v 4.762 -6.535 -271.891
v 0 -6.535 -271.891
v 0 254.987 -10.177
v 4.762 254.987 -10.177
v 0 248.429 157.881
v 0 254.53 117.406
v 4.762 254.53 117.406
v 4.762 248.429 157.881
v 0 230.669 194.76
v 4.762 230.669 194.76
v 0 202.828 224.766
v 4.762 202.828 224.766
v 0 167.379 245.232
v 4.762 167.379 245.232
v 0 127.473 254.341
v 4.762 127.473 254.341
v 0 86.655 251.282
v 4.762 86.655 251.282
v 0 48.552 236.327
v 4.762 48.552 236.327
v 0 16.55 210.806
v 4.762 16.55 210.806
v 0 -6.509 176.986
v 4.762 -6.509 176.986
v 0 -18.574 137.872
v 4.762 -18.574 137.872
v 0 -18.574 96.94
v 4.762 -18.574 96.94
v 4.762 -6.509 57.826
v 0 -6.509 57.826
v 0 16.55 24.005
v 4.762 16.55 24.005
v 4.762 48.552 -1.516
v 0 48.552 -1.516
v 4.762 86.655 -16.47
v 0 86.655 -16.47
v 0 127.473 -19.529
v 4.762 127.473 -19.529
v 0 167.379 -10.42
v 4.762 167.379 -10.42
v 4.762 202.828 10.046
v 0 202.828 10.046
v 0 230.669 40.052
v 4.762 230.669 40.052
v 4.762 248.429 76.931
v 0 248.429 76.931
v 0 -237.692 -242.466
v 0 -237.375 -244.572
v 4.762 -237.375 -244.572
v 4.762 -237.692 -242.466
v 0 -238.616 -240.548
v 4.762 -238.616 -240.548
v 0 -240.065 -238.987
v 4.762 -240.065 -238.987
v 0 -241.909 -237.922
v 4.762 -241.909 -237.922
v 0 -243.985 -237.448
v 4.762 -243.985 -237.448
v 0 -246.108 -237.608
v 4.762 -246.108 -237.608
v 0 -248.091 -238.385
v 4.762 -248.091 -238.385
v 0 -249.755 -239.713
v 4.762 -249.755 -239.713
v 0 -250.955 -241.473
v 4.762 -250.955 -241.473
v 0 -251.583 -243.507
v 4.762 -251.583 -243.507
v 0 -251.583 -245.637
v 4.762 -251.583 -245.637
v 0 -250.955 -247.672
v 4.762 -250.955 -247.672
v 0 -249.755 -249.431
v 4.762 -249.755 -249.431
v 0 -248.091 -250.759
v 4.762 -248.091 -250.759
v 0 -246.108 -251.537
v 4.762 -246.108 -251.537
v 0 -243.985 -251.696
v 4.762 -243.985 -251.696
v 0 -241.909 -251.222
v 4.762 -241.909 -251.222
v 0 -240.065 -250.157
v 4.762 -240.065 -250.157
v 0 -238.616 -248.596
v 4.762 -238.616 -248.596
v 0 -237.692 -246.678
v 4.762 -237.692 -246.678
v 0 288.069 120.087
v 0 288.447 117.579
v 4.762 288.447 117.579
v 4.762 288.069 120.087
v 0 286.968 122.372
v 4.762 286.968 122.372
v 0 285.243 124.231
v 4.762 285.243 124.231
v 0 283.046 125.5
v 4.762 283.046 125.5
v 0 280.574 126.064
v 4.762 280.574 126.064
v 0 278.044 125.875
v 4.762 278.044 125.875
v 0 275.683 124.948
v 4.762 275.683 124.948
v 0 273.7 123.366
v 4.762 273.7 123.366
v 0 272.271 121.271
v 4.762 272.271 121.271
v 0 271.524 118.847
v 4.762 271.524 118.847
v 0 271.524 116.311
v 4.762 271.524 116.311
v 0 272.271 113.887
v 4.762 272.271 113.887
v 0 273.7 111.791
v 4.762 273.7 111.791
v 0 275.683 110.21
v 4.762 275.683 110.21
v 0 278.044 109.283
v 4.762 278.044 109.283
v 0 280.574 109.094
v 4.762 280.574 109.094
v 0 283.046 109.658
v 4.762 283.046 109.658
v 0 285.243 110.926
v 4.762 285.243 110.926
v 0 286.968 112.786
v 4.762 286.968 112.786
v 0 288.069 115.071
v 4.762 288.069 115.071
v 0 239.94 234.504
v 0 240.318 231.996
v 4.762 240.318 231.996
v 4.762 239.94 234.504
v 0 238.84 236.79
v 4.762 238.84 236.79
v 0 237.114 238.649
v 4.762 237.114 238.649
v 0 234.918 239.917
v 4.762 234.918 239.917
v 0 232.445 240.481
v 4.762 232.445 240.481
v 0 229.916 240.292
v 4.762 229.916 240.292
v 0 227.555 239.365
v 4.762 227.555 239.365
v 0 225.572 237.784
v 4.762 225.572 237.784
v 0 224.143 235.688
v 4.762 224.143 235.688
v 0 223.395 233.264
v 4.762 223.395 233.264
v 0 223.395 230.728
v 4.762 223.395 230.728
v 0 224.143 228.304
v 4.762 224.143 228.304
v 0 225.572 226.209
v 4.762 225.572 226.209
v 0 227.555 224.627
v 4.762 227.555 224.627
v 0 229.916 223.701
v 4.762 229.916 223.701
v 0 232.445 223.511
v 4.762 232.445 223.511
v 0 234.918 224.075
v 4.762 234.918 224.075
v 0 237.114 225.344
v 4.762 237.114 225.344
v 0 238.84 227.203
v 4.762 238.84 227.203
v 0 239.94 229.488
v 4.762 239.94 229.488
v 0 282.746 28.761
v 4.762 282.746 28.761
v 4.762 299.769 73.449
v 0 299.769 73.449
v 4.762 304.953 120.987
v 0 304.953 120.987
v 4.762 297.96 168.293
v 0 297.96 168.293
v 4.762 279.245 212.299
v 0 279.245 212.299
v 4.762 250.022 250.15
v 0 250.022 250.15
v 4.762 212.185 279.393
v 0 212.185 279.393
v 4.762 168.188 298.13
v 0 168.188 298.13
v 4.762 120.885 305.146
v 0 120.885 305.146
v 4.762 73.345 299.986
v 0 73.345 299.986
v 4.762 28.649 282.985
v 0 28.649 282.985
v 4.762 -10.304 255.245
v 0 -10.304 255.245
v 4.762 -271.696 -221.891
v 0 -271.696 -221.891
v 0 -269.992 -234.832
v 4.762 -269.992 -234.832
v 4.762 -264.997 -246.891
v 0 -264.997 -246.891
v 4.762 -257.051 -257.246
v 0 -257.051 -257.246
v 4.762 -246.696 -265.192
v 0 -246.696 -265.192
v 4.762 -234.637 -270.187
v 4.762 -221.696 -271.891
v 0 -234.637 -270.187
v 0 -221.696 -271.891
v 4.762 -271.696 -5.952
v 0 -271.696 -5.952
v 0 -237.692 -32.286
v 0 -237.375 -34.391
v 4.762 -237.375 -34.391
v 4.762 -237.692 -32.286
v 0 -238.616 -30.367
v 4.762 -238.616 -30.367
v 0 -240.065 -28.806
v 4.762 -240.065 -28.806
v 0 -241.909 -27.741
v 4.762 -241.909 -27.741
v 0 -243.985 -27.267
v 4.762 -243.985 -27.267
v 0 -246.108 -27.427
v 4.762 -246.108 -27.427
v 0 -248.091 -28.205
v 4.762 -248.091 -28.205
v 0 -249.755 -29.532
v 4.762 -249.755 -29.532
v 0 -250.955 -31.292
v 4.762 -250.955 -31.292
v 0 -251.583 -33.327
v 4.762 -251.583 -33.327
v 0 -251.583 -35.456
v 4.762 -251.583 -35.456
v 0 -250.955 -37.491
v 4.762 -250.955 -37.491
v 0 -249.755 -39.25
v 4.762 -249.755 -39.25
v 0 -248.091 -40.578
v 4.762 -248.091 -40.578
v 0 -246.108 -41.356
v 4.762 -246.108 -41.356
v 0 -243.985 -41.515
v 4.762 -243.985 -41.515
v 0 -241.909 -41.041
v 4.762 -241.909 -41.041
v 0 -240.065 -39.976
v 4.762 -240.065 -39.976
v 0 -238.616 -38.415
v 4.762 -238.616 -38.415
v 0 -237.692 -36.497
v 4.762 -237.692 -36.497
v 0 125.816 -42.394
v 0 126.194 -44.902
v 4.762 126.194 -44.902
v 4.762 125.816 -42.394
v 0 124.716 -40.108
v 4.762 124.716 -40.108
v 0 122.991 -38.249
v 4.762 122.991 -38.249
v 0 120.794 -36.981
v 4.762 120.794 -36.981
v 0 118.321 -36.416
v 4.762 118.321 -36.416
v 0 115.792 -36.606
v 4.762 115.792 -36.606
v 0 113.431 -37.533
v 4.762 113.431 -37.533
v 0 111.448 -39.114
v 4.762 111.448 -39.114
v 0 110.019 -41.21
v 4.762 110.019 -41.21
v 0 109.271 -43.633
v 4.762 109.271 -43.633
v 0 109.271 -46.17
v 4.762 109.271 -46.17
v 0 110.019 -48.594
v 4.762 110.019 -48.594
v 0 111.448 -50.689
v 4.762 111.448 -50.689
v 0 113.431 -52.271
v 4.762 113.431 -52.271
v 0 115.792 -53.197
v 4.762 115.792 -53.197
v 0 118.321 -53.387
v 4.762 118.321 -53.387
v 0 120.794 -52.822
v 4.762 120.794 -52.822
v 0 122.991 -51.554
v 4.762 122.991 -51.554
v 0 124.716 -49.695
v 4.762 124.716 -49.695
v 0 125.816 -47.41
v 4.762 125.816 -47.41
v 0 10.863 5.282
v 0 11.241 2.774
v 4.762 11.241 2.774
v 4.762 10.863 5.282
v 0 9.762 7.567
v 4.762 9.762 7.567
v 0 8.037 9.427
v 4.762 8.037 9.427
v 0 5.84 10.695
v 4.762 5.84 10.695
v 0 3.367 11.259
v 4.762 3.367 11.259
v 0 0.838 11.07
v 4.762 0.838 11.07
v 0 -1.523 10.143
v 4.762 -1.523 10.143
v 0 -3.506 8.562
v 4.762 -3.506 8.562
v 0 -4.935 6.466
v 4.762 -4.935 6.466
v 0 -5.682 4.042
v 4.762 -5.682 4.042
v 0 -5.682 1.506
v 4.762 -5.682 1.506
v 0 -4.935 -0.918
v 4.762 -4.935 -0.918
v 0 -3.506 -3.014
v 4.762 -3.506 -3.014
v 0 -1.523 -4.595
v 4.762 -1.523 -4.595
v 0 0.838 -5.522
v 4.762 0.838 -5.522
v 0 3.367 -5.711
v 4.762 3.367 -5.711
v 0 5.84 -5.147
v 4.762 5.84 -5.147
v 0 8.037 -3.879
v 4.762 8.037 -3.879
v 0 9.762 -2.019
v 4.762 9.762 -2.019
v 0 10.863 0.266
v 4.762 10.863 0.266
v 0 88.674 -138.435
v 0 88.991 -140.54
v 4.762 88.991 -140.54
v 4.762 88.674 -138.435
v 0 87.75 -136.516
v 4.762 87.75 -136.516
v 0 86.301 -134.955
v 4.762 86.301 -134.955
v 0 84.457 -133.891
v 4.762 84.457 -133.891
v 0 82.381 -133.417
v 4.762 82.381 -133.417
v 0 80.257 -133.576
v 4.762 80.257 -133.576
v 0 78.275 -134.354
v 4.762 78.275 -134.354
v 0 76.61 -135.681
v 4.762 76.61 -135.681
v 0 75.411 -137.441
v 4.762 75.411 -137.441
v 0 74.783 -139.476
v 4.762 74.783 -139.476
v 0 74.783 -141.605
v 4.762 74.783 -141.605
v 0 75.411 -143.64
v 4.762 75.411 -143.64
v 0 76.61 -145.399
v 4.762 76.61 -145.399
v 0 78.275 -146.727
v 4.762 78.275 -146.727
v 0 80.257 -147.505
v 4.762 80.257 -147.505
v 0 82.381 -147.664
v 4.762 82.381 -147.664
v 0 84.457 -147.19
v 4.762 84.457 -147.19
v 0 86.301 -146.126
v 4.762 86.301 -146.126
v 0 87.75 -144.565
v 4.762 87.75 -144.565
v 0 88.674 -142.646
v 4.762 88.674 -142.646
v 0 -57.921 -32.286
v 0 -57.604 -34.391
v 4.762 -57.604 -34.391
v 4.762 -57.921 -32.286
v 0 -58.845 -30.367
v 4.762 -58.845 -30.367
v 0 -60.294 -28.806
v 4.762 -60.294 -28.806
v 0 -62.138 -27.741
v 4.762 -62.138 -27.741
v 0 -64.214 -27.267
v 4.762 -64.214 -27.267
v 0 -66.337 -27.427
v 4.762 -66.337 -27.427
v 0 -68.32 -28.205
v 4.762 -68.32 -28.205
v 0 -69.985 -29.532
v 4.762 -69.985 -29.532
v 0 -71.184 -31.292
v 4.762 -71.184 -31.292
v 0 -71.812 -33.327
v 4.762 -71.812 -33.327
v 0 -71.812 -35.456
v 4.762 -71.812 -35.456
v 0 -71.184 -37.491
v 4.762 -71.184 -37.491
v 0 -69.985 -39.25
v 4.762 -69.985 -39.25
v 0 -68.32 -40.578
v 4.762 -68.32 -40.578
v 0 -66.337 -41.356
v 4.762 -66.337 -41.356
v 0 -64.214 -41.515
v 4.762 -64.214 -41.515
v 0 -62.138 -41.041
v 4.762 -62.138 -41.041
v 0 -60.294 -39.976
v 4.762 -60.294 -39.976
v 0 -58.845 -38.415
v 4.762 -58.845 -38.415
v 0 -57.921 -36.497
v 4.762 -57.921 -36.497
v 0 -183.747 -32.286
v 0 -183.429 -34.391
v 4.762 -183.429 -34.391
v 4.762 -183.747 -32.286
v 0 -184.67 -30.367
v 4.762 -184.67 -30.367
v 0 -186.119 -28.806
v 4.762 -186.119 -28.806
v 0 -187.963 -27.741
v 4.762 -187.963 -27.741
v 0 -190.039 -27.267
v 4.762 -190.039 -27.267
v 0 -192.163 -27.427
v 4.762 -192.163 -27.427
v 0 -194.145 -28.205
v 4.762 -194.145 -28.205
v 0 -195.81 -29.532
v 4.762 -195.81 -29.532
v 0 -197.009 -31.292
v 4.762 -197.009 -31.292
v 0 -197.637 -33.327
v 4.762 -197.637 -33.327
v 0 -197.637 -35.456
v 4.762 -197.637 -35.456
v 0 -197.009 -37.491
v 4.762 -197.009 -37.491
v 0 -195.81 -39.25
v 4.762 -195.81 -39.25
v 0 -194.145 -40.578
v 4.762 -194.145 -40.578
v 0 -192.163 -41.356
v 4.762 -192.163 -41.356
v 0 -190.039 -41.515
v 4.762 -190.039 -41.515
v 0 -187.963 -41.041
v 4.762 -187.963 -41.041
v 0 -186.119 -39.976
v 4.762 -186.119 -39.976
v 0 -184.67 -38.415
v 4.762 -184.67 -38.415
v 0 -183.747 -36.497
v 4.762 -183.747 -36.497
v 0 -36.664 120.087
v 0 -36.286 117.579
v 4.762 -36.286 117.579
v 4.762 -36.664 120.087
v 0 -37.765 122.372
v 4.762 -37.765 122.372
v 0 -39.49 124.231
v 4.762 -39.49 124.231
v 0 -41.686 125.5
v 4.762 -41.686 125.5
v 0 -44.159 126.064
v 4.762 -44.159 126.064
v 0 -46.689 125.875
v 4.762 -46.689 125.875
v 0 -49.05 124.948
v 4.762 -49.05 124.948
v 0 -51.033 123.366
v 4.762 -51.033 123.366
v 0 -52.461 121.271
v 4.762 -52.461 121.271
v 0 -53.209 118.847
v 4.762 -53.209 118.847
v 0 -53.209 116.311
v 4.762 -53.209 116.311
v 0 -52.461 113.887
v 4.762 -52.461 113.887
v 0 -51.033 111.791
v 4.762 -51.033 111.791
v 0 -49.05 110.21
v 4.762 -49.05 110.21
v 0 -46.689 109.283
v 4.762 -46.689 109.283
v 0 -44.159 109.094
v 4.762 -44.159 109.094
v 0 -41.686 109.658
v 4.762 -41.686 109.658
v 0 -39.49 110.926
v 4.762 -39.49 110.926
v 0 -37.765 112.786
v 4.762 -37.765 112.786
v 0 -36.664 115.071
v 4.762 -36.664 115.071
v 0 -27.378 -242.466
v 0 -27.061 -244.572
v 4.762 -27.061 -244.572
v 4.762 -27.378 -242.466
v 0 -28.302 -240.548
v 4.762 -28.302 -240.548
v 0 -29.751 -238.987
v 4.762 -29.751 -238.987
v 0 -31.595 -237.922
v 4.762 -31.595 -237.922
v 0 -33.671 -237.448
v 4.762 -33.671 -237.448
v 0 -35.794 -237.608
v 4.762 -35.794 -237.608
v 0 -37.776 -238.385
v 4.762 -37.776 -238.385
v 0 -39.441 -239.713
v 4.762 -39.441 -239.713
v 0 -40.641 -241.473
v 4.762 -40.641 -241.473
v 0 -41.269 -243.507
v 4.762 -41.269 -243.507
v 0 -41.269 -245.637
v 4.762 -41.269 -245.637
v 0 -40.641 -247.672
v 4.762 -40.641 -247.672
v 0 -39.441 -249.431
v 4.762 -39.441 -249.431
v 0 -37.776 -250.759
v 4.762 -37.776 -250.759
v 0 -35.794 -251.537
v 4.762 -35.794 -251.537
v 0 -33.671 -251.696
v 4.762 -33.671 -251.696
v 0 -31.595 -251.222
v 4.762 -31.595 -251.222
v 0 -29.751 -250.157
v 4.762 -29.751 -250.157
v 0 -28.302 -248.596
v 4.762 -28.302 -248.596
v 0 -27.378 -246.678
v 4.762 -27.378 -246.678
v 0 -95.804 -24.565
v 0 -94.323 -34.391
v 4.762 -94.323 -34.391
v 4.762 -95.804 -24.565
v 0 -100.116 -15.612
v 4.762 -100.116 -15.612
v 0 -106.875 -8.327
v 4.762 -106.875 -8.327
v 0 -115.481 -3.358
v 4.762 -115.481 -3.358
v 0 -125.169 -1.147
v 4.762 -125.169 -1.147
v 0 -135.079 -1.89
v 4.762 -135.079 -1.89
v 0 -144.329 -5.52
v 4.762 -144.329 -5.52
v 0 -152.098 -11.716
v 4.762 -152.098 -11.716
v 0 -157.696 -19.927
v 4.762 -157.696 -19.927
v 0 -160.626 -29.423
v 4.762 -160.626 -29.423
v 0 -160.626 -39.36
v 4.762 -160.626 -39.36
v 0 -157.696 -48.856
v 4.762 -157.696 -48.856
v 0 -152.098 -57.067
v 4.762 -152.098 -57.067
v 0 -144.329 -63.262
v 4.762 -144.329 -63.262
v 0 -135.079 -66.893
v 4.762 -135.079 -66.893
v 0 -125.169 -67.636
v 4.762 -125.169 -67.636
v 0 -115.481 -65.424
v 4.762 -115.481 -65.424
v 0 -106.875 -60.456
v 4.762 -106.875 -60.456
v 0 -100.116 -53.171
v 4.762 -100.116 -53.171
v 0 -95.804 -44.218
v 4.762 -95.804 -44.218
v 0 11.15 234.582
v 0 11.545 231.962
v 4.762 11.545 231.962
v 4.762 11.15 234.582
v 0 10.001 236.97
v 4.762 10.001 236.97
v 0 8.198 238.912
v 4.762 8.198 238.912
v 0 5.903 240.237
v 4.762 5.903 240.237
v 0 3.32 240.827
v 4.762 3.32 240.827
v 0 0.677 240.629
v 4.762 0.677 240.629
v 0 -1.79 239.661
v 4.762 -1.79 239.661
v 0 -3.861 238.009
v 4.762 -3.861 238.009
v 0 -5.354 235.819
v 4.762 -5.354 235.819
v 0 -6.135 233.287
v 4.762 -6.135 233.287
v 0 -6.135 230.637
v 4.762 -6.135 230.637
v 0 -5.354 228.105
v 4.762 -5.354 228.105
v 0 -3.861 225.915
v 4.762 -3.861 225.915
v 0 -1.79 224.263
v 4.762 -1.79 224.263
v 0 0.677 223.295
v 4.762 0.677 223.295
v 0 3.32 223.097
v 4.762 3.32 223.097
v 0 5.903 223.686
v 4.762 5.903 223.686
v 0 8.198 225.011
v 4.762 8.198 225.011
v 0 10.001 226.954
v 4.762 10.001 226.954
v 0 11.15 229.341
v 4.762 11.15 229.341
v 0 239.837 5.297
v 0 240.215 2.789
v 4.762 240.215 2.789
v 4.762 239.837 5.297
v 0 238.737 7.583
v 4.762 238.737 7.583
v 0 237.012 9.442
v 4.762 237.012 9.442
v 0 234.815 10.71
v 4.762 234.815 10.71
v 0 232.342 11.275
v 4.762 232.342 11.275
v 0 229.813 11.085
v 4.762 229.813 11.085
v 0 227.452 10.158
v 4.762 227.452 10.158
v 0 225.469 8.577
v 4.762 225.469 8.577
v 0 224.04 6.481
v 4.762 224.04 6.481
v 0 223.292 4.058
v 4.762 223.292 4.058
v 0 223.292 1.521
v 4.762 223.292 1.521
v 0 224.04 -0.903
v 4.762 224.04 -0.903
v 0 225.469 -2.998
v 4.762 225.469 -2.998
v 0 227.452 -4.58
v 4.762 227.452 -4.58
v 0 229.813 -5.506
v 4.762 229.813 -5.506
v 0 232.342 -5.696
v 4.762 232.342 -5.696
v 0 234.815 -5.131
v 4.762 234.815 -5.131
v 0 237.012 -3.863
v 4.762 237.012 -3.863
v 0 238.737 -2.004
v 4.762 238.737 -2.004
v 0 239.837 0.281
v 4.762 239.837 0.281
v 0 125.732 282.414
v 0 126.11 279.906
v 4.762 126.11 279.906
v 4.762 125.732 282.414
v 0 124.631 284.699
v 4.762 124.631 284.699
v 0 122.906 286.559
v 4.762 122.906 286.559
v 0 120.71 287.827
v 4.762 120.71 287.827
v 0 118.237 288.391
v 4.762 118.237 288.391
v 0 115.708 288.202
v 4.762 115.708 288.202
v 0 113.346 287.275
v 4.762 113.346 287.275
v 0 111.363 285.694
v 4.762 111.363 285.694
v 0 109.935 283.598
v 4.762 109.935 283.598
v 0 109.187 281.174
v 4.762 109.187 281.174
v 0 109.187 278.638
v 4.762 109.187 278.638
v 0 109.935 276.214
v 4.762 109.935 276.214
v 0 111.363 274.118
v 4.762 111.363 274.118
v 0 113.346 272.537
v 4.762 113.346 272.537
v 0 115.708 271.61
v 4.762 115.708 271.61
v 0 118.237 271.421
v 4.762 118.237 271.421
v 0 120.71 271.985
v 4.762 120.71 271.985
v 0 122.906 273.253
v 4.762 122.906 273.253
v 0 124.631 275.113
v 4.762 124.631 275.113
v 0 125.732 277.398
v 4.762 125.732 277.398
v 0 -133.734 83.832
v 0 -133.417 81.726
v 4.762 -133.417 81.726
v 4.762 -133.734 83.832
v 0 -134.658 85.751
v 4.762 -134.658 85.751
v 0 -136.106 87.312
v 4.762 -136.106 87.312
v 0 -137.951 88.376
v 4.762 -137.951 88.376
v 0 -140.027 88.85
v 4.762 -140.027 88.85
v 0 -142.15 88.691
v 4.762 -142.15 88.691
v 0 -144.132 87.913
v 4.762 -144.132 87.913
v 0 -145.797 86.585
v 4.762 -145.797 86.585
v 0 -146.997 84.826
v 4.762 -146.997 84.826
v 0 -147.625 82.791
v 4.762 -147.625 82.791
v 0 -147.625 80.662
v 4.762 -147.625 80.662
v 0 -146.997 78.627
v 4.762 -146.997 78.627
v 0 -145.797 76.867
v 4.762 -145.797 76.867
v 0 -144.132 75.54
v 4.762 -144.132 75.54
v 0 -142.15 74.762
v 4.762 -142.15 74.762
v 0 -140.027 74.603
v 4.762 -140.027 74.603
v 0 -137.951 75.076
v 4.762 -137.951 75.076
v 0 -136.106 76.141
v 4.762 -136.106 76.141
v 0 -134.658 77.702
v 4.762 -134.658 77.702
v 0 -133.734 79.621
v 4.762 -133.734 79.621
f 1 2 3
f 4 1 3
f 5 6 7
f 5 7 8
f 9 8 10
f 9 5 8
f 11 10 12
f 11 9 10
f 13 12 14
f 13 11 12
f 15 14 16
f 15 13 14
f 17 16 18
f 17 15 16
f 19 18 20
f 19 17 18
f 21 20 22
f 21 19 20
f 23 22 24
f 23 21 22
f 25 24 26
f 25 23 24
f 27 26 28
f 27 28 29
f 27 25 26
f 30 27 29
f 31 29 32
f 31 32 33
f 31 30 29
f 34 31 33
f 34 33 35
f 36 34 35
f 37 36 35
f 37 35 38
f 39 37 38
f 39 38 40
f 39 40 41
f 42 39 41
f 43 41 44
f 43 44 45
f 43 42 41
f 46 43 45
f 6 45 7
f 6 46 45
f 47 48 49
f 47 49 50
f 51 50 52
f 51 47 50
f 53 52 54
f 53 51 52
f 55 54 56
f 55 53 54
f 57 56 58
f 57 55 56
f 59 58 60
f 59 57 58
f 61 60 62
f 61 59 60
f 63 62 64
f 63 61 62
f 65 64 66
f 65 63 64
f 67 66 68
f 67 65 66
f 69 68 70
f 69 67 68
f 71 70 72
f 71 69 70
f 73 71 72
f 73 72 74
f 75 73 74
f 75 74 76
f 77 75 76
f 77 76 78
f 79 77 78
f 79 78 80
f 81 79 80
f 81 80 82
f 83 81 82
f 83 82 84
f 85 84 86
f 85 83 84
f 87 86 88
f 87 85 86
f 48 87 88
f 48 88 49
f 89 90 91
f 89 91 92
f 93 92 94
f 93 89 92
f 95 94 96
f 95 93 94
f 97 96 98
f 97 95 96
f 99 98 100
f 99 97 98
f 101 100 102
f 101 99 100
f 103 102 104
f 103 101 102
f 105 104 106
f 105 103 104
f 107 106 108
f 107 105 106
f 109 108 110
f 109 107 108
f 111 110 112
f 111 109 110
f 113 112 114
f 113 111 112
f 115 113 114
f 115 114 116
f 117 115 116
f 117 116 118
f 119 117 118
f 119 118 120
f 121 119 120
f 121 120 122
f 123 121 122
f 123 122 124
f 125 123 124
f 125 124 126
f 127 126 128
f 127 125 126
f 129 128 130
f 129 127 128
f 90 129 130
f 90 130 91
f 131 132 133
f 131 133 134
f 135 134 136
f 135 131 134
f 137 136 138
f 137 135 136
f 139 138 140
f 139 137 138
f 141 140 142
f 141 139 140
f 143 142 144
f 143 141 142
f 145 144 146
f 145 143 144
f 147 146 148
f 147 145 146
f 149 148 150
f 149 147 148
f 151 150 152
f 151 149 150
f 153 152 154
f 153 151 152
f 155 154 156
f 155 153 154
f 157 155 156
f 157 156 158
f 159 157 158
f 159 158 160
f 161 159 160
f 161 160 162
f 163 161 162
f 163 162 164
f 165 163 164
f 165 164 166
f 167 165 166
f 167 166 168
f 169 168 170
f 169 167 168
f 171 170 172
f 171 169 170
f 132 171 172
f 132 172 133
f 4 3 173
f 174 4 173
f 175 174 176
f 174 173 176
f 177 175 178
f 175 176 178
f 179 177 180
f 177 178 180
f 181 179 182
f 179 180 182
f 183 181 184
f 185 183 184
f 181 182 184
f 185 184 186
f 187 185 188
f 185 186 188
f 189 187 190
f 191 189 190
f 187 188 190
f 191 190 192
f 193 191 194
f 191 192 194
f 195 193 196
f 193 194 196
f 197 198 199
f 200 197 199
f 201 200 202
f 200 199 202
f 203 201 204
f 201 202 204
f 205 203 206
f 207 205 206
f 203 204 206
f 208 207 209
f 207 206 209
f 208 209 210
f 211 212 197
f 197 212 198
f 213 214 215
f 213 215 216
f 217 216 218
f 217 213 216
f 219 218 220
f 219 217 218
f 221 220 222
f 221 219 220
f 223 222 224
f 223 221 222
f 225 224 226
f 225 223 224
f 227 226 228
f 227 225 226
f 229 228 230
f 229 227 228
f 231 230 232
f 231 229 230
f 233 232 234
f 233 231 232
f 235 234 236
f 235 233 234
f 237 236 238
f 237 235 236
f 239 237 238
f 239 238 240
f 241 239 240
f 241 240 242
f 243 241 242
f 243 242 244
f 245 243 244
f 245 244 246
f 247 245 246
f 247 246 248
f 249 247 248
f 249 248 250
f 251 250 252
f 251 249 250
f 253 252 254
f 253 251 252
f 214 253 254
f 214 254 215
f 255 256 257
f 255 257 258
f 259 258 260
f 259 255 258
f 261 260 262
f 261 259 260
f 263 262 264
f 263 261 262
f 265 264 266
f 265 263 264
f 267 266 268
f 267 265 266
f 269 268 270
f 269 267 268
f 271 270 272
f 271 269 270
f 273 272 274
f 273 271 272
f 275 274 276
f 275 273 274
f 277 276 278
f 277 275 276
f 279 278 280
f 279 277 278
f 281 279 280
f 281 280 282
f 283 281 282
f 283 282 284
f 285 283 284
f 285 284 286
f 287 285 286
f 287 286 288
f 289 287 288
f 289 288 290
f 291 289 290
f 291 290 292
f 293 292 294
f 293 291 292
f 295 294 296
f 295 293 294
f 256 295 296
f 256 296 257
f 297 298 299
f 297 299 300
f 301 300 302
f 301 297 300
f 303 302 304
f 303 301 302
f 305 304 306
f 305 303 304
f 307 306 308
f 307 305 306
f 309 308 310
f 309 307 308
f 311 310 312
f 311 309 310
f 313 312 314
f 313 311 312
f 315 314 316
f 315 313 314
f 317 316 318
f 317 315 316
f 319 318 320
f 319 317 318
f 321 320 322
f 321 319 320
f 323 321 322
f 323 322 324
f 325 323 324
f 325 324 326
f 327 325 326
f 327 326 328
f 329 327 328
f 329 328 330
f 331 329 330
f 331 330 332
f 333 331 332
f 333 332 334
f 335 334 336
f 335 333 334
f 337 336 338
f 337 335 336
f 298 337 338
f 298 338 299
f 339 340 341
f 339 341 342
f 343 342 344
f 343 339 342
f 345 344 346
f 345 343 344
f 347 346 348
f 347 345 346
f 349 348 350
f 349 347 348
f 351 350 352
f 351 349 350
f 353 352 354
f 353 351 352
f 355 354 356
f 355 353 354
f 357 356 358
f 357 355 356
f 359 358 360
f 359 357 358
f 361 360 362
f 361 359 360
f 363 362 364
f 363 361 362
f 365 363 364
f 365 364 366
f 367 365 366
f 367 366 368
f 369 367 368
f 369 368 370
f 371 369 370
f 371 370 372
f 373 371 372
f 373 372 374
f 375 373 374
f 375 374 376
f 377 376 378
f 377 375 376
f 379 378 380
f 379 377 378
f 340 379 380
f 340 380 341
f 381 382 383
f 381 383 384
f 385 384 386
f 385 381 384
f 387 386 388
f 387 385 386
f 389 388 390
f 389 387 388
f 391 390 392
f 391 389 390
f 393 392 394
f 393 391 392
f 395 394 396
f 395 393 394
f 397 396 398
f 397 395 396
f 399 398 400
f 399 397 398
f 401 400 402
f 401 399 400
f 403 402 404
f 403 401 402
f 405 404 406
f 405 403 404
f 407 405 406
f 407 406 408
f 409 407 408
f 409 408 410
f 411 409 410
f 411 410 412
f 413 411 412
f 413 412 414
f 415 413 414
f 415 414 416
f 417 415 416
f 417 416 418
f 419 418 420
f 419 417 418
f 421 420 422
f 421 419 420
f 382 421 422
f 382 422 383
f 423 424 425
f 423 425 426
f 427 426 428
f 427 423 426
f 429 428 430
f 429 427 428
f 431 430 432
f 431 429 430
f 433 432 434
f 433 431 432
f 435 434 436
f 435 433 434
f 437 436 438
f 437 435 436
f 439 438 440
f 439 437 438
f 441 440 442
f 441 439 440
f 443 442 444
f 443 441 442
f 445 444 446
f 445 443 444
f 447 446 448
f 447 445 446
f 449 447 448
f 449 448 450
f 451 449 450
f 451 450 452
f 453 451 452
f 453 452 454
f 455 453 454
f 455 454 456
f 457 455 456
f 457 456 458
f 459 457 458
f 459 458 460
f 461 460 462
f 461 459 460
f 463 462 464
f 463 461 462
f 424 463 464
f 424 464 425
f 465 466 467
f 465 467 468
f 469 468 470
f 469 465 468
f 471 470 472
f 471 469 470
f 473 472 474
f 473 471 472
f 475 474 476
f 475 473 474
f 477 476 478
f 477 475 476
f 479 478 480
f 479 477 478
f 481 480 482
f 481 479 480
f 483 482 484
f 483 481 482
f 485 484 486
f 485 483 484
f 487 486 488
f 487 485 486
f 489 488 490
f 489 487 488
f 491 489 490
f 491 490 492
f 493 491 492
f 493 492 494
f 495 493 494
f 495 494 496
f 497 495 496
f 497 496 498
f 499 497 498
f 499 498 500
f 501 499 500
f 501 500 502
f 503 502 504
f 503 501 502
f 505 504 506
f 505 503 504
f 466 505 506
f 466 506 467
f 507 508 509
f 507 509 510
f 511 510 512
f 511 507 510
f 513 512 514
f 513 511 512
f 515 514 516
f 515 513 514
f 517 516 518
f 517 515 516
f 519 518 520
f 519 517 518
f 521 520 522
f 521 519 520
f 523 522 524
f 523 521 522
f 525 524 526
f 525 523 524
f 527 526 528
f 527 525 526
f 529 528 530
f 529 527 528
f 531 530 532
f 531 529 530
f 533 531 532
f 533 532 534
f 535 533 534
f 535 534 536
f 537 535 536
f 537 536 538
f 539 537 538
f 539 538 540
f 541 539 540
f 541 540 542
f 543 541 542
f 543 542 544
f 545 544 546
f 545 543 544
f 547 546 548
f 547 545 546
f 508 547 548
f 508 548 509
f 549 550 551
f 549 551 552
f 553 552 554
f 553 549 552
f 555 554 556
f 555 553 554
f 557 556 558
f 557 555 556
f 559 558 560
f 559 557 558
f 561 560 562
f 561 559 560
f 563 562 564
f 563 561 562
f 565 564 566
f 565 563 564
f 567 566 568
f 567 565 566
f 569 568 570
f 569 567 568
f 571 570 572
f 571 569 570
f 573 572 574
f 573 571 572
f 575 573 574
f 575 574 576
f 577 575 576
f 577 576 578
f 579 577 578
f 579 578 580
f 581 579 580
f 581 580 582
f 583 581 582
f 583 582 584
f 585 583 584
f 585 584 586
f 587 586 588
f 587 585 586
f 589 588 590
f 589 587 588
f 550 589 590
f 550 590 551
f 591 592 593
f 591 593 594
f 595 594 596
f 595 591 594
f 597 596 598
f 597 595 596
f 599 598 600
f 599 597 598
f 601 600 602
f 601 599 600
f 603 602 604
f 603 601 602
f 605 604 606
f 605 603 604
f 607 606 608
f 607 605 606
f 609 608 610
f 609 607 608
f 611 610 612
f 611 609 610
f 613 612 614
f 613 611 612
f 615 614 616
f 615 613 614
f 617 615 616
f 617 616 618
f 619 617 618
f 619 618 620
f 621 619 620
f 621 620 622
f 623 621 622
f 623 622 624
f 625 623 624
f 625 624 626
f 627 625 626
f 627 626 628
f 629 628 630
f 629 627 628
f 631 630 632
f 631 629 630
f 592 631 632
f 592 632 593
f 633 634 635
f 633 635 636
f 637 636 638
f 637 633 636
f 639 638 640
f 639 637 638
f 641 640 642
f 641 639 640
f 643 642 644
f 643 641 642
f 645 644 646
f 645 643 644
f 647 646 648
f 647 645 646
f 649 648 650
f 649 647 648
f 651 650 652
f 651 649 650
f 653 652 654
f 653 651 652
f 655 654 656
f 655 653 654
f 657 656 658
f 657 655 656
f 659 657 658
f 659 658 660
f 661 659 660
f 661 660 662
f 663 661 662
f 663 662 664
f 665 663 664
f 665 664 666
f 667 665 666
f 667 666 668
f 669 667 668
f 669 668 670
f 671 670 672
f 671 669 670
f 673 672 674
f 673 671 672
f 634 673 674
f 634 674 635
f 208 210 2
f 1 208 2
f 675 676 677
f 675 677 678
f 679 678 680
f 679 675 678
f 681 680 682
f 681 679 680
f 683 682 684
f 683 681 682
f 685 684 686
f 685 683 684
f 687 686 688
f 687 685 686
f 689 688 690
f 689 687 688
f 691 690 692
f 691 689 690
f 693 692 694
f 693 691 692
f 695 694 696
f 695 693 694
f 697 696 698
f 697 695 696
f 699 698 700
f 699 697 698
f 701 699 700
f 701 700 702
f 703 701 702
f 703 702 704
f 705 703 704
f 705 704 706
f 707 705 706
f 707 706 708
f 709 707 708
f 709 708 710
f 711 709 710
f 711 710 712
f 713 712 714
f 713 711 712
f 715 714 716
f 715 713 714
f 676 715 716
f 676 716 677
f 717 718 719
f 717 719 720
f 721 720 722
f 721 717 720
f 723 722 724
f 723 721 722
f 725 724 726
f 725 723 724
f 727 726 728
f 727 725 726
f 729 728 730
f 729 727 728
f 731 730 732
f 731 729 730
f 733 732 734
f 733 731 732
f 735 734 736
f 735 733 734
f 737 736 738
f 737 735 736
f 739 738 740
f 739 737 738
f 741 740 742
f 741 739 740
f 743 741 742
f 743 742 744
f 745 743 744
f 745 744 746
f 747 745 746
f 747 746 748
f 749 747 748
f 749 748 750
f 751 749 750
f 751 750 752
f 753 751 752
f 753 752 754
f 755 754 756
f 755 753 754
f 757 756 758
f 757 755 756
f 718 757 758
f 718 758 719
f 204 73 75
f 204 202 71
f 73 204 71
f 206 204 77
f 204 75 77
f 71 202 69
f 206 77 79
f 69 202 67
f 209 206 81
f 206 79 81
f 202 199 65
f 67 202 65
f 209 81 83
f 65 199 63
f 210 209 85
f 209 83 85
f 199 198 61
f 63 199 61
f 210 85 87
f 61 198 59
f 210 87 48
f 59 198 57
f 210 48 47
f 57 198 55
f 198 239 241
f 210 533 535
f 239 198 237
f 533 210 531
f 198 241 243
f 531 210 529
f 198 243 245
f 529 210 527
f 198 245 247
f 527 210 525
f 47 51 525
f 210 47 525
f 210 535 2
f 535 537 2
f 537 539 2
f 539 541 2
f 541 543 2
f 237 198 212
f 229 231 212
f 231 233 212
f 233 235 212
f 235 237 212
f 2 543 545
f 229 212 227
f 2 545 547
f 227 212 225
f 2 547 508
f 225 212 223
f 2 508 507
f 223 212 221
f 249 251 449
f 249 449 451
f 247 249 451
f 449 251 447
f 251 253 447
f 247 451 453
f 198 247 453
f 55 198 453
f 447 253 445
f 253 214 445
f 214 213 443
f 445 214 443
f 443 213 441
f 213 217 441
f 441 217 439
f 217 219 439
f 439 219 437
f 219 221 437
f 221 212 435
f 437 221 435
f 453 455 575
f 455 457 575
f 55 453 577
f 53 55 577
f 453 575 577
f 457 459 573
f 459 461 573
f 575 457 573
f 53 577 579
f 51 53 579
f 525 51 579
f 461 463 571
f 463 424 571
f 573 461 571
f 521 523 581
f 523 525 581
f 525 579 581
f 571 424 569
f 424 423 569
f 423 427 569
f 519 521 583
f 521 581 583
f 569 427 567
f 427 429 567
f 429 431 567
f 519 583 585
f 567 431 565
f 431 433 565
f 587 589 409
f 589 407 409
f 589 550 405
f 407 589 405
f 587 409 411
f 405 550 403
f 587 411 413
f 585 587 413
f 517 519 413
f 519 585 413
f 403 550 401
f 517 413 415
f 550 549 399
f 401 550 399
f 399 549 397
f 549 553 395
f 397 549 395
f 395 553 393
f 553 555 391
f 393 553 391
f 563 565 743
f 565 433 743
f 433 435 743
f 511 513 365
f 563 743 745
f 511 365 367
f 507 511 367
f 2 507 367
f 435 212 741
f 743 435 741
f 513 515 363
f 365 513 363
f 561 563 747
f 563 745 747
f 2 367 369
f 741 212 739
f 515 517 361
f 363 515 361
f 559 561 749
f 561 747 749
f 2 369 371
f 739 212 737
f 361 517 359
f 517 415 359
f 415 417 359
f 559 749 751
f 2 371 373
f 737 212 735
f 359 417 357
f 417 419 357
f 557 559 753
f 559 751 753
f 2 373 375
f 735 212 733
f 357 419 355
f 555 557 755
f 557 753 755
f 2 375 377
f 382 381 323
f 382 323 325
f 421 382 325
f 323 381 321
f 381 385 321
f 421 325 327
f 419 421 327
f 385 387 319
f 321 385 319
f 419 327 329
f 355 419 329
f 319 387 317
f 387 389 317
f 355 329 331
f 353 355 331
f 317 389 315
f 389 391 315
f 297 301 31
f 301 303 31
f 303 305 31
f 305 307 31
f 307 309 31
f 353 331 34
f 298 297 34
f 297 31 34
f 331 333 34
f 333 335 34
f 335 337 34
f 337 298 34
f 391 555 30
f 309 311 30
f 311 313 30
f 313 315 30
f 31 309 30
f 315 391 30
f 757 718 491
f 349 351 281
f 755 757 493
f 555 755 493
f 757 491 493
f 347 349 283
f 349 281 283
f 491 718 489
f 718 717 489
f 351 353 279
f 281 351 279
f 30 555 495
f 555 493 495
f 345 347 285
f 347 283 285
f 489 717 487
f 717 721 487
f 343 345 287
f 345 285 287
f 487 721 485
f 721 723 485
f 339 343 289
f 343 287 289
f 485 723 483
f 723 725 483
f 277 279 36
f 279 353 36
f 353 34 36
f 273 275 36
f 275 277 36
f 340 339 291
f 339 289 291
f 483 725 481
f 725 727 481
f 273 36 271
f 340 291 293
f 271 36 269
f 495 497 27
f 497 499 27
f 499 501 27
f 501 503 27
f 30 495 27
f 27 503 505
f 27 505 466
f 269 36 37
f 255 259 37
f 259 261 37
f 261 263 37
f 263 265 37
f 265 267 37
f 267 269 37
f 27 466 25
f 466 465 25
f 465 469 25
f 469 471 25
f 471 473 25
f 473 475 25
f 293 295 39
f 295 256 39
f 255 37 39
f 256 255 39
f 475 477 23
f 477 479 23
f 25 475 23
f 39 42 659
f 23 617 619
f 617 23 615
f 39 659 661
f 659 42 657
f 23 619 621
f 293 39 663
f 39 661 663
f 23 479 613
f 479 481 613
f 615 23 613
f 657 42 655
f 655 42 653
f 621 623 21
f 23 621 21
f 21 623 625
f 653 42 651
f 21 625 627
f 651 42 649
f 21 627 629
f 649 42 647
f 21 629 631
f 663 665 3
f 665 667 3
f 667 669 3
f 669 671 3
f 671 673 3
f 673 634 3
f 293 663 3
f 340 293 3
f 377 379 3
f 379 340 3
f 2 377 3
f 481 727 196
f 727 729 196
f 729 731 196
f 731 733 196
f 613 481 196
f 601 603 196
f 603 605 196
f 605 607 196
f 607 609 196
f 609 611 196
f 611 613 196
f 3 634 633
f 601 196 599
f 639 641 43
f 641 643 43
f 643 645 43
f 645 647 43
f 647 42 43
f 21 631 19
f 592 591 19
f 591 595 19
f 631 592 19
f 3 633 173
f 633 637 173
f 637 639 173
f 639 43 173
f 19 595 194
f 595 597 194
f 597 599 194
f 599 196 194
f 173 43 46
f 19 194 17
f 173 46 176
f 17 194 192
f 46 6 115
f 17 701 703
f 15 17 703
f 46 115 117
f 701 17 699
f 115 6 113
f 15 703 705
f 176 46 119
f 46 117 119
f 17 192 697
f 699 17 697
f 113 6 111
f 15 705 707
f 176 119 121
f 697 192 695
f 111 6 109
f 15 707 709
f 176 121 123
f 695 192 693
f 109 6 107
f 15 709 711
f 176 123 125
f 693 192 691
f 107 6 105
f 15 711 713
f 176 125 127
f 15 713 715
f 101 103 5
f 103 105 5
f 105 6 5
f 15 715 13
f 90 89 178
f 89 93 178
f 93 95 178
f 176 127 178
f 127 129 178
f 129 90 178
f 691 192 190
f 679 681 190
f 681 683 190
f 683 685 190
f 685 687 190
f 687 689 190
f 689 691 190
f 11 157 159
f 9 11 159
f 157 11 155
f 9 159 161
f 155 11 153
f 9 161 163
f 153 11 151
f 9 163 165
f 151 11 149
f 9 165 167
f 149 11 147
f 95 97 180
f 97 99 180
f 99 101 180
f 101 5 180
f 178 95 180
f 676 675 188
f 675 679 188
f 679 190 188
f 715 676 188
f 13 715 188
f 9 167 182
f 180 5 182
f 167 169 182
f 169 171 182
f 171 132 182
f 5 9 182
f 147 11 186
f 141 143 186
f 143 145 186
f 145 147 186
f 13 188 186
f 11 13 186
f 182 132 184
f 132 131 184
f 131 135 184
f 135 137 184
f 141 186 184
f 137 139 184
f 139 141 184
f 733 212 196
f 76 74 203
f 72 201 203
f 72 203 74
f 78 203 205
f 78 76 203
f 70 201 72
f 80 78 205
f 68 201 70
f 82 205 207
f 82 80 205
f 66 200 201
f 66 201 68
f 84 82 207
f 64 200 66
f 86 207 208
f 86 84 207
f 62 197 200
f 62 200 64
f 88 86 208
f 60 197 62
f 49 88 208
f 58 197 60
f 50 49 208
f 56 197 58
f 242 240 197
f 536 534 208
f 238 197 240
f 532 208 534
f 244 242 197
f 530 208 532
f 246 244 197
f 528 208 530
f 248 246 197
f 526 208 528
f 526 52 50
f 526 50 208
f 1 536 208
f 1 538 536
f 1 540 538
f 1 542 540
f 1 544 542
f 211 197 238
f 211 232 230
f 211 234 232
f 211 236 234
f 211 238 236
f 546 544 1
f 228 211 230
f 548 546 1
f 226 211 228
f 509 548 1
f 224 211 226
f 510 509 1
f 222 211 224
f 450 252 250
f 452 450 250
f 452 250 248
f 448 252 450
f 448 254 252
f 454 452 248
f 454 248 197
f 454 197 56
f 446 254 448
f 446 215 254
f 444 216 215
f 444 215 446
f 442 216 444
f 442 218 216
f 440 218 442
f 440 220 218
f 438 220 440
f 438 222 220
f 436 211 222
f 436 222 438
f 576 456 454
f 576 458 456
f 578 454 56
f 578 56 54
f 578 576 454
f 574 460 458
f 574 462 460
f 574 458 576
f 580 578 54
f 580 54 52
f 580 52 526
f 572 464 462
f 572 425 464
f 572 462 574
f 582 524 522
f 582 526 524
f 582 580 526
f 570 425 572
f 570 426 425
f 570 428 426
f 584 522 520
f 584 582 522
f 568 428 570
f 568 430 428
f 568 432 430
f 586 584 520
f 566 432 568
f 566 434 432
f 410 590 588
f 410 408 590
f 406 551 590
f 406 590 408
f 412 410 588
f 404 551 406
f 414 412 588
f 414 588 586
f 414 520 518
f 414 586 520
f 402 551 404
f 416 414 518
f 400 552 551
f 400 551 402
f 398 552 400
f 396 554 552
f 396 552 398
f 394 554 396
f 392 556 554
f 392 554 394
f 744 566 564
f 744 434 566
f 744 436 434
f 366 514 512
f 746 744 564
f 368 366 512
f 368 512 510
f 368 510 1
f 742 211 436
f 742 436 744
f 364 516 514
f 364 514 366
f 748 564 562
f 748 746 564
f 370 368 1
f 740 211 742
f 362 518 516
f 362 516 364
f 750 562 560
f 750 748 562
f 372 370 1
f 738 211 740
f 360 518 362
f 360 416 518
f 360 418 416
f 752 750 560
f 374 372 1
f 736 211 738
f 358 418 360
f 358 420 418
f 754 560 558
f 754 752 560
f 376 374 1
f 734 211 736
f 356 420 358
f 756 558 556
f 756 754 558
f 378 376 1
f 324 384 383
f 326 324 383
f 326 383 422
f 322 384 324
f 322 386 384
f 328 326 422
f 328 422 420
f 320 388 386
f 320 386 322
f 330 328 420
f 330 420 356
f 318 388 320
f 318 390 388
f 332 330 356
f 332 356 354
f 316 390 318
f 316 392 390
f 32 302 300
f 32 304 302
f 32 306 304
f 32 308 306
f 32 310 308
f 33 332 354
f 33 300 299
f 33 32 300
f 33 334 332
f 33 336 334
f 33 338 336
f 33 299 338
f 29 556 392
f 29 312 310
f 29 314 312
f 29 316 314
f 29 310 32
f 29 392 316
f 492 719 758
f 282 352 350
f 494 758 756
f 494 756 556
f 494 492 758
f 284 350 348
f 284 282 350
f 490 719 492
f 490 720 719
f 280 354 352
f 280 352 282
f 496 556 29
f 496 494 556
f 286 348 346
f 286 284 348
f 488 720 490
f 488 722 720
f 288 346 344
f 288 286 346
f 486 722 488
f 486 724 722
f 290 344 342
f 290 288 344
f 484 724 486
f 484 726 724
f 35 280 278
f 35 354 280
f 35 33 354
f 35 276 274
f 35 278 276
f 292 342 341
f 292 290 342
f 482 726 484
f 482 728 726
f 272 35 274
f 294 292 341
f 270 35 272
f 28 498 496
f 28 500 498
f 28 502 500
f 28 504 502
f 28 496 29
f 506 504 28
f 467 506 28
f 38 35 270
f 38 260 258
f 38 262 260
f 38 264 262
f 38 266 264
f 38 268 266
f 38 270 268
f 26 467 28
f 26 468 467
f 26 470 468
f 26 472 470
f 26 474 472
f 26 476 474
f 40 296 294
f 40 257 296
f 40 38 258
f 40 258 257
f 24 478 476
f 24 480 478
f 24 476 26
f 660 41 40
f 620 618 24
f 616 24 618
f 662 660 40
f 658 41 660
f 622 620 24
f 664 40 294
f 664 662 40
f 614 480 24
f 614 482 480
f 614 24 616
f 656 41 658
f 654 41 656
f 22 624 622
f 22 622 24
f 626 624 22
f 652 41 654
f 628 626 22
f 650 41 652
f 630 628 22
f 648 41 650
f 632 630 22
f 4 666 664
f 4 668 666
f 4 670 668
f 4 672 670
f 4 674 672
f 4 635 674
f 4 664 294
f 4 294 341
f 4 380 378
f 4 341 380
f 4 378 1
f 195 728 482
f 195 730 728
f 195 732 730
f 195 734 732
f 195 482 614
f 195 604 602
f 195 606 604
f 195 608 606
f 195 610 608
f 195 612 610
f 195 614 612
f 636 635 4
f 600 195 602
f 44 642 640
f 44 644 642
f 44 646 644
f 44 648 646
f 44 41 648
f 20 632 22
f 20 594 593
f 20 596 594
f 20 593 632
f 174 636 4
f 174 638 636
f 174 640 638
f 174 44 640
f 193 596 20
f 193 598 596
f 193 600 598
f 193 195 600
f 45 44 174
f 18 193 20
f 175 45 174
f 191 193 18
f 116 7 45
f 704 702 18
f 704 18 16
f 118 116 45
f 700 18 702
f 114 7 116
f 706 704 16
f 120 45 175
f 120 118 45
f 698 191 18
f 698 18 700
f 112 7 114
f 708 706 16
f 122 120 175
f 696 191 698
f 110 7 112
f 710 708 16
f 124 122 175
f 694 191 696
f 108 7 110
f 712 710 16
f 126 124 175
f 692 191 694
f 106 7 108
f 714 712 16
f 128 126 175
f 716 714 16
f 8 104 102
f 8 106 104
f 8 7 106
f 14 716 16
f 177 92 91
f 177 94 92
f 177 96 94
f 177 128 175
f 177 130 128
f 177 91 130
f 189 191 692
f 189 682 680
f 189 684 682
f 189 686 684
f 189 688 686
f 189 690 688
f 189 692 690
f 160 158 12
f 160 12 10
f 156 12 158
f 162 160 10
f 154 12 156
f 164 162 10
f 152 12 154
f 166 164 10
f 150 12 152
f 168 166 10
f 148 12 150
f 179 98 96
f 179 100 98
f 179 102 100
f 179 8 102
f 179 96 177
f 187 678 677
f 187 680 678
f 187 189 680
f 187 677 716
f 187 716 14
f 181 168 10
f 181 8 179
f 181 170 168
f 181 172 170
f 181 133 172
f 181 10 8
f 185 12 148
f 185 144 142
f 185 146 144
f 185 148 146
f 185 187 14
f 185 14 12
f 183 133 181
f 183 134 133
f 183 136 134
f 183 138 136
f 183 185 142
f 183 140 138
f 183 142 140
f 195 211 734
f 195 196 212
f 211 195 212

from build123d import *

# Parameters (mm, degrees)
F0_R     = 7.14375
F0_R_2   = 33.3375
F0_R_3   = 8.509
F0_R_4   = 8.89
F0_R_5   = 137.31875
F1_DEPTH = 4.7625


with BuildPart() as f1:
    # F0 (on Right) → F1 (new body)
    with BuildSketch(Plane.YZ):
        with BuildLine():
            Line((-271.696104, -5.952033), (-271.696104, -221.890895))
            ThreePointArc((-271.696104, -221.890895), (-257.051472, -257.246163), (-221.696204, -271.890795))
            Line((-221.696204, -271.890795), (-6.535242, -271.890795))
            Line((-6.535242, -271.890795), (254.987282, -10.17713))
            ThreePointArc((254.987282, -10.17713), (250.021545, 250.150476), (-10.30357, 255.245143))
            Line((-10.30357, 255.245143), (-271.696104, -5.952033))
        make_face()
        with Locations((-244.518688, -244.572155)):
            Circle(F0_R, mode=Mode.SUBTRACT)
        with Locations((-34.20458, -244.572155)):
            Circle(F0_R, mode=Mode.SUBTRACT)
        with Locations((-244.518688, -34.39127)):
            Circle(F0_R, mode=Mode.SUBTRACT)
        with Locations((-190.572923, -34.39127)):
            Circle(F0_R, mode=Mode.SUBTRACT)
        with Locations((-127.660375, -34.39127)):
            Circle(F0_R_2, mode=Mode.SUBTRACT)
        with Locations((-64.7478, -34.39127)):
            Circle(F0_R, mode=Mode.SUBTRACT)
        with Locations((2.731567, 2.773934)):
            Circle(F0_R_3, mode=Mode.SUBTRACT)
        with Locations((81.847131, -140.540435)):
            Circle(F0_R, mode=Mode.SUBTRACT)
        with Locations((117.685388, -44.901637)):
            Circle(F0_R_3, mode=Mode.SUBTRACT)
        with Locations((231.706395, 2.789326)):
            Circle(F0_R_3, mode=Mode.SUBTRACT)
        with Locations((-140.560552, 81.726329)):
            Circle(F0_R, mode=Mode.SUBTRACT)
        with Locations((-44.795135, 117.578861)):
            Circle(F0_R_3, mode=Mode.SUBTRACT)
        with Locations((2.655392, 231.961842)):
            Circle(F0_R_4, mode=Mode.SUBTRACT)
        with Locations((117.211272, 117.405963)):
            Circle(F0_R_5, mode=Mode.SUBTRACT)
        with Locations((279.937693, 117.578861)):
            Circle(F0_R_3, mode=Mode.SUBTRACT)
        with Locations((117.600933, 279.905917)):
            Circle(F0_R_3, mode=Mode.SUBTRACT)
        with Locations((231.809138, 231.996234)):
            Circle(F0_R_3, mode=Mode.SUBTRACT)
    extrude(amount=F1_DEPTH)


solid = f1.part
